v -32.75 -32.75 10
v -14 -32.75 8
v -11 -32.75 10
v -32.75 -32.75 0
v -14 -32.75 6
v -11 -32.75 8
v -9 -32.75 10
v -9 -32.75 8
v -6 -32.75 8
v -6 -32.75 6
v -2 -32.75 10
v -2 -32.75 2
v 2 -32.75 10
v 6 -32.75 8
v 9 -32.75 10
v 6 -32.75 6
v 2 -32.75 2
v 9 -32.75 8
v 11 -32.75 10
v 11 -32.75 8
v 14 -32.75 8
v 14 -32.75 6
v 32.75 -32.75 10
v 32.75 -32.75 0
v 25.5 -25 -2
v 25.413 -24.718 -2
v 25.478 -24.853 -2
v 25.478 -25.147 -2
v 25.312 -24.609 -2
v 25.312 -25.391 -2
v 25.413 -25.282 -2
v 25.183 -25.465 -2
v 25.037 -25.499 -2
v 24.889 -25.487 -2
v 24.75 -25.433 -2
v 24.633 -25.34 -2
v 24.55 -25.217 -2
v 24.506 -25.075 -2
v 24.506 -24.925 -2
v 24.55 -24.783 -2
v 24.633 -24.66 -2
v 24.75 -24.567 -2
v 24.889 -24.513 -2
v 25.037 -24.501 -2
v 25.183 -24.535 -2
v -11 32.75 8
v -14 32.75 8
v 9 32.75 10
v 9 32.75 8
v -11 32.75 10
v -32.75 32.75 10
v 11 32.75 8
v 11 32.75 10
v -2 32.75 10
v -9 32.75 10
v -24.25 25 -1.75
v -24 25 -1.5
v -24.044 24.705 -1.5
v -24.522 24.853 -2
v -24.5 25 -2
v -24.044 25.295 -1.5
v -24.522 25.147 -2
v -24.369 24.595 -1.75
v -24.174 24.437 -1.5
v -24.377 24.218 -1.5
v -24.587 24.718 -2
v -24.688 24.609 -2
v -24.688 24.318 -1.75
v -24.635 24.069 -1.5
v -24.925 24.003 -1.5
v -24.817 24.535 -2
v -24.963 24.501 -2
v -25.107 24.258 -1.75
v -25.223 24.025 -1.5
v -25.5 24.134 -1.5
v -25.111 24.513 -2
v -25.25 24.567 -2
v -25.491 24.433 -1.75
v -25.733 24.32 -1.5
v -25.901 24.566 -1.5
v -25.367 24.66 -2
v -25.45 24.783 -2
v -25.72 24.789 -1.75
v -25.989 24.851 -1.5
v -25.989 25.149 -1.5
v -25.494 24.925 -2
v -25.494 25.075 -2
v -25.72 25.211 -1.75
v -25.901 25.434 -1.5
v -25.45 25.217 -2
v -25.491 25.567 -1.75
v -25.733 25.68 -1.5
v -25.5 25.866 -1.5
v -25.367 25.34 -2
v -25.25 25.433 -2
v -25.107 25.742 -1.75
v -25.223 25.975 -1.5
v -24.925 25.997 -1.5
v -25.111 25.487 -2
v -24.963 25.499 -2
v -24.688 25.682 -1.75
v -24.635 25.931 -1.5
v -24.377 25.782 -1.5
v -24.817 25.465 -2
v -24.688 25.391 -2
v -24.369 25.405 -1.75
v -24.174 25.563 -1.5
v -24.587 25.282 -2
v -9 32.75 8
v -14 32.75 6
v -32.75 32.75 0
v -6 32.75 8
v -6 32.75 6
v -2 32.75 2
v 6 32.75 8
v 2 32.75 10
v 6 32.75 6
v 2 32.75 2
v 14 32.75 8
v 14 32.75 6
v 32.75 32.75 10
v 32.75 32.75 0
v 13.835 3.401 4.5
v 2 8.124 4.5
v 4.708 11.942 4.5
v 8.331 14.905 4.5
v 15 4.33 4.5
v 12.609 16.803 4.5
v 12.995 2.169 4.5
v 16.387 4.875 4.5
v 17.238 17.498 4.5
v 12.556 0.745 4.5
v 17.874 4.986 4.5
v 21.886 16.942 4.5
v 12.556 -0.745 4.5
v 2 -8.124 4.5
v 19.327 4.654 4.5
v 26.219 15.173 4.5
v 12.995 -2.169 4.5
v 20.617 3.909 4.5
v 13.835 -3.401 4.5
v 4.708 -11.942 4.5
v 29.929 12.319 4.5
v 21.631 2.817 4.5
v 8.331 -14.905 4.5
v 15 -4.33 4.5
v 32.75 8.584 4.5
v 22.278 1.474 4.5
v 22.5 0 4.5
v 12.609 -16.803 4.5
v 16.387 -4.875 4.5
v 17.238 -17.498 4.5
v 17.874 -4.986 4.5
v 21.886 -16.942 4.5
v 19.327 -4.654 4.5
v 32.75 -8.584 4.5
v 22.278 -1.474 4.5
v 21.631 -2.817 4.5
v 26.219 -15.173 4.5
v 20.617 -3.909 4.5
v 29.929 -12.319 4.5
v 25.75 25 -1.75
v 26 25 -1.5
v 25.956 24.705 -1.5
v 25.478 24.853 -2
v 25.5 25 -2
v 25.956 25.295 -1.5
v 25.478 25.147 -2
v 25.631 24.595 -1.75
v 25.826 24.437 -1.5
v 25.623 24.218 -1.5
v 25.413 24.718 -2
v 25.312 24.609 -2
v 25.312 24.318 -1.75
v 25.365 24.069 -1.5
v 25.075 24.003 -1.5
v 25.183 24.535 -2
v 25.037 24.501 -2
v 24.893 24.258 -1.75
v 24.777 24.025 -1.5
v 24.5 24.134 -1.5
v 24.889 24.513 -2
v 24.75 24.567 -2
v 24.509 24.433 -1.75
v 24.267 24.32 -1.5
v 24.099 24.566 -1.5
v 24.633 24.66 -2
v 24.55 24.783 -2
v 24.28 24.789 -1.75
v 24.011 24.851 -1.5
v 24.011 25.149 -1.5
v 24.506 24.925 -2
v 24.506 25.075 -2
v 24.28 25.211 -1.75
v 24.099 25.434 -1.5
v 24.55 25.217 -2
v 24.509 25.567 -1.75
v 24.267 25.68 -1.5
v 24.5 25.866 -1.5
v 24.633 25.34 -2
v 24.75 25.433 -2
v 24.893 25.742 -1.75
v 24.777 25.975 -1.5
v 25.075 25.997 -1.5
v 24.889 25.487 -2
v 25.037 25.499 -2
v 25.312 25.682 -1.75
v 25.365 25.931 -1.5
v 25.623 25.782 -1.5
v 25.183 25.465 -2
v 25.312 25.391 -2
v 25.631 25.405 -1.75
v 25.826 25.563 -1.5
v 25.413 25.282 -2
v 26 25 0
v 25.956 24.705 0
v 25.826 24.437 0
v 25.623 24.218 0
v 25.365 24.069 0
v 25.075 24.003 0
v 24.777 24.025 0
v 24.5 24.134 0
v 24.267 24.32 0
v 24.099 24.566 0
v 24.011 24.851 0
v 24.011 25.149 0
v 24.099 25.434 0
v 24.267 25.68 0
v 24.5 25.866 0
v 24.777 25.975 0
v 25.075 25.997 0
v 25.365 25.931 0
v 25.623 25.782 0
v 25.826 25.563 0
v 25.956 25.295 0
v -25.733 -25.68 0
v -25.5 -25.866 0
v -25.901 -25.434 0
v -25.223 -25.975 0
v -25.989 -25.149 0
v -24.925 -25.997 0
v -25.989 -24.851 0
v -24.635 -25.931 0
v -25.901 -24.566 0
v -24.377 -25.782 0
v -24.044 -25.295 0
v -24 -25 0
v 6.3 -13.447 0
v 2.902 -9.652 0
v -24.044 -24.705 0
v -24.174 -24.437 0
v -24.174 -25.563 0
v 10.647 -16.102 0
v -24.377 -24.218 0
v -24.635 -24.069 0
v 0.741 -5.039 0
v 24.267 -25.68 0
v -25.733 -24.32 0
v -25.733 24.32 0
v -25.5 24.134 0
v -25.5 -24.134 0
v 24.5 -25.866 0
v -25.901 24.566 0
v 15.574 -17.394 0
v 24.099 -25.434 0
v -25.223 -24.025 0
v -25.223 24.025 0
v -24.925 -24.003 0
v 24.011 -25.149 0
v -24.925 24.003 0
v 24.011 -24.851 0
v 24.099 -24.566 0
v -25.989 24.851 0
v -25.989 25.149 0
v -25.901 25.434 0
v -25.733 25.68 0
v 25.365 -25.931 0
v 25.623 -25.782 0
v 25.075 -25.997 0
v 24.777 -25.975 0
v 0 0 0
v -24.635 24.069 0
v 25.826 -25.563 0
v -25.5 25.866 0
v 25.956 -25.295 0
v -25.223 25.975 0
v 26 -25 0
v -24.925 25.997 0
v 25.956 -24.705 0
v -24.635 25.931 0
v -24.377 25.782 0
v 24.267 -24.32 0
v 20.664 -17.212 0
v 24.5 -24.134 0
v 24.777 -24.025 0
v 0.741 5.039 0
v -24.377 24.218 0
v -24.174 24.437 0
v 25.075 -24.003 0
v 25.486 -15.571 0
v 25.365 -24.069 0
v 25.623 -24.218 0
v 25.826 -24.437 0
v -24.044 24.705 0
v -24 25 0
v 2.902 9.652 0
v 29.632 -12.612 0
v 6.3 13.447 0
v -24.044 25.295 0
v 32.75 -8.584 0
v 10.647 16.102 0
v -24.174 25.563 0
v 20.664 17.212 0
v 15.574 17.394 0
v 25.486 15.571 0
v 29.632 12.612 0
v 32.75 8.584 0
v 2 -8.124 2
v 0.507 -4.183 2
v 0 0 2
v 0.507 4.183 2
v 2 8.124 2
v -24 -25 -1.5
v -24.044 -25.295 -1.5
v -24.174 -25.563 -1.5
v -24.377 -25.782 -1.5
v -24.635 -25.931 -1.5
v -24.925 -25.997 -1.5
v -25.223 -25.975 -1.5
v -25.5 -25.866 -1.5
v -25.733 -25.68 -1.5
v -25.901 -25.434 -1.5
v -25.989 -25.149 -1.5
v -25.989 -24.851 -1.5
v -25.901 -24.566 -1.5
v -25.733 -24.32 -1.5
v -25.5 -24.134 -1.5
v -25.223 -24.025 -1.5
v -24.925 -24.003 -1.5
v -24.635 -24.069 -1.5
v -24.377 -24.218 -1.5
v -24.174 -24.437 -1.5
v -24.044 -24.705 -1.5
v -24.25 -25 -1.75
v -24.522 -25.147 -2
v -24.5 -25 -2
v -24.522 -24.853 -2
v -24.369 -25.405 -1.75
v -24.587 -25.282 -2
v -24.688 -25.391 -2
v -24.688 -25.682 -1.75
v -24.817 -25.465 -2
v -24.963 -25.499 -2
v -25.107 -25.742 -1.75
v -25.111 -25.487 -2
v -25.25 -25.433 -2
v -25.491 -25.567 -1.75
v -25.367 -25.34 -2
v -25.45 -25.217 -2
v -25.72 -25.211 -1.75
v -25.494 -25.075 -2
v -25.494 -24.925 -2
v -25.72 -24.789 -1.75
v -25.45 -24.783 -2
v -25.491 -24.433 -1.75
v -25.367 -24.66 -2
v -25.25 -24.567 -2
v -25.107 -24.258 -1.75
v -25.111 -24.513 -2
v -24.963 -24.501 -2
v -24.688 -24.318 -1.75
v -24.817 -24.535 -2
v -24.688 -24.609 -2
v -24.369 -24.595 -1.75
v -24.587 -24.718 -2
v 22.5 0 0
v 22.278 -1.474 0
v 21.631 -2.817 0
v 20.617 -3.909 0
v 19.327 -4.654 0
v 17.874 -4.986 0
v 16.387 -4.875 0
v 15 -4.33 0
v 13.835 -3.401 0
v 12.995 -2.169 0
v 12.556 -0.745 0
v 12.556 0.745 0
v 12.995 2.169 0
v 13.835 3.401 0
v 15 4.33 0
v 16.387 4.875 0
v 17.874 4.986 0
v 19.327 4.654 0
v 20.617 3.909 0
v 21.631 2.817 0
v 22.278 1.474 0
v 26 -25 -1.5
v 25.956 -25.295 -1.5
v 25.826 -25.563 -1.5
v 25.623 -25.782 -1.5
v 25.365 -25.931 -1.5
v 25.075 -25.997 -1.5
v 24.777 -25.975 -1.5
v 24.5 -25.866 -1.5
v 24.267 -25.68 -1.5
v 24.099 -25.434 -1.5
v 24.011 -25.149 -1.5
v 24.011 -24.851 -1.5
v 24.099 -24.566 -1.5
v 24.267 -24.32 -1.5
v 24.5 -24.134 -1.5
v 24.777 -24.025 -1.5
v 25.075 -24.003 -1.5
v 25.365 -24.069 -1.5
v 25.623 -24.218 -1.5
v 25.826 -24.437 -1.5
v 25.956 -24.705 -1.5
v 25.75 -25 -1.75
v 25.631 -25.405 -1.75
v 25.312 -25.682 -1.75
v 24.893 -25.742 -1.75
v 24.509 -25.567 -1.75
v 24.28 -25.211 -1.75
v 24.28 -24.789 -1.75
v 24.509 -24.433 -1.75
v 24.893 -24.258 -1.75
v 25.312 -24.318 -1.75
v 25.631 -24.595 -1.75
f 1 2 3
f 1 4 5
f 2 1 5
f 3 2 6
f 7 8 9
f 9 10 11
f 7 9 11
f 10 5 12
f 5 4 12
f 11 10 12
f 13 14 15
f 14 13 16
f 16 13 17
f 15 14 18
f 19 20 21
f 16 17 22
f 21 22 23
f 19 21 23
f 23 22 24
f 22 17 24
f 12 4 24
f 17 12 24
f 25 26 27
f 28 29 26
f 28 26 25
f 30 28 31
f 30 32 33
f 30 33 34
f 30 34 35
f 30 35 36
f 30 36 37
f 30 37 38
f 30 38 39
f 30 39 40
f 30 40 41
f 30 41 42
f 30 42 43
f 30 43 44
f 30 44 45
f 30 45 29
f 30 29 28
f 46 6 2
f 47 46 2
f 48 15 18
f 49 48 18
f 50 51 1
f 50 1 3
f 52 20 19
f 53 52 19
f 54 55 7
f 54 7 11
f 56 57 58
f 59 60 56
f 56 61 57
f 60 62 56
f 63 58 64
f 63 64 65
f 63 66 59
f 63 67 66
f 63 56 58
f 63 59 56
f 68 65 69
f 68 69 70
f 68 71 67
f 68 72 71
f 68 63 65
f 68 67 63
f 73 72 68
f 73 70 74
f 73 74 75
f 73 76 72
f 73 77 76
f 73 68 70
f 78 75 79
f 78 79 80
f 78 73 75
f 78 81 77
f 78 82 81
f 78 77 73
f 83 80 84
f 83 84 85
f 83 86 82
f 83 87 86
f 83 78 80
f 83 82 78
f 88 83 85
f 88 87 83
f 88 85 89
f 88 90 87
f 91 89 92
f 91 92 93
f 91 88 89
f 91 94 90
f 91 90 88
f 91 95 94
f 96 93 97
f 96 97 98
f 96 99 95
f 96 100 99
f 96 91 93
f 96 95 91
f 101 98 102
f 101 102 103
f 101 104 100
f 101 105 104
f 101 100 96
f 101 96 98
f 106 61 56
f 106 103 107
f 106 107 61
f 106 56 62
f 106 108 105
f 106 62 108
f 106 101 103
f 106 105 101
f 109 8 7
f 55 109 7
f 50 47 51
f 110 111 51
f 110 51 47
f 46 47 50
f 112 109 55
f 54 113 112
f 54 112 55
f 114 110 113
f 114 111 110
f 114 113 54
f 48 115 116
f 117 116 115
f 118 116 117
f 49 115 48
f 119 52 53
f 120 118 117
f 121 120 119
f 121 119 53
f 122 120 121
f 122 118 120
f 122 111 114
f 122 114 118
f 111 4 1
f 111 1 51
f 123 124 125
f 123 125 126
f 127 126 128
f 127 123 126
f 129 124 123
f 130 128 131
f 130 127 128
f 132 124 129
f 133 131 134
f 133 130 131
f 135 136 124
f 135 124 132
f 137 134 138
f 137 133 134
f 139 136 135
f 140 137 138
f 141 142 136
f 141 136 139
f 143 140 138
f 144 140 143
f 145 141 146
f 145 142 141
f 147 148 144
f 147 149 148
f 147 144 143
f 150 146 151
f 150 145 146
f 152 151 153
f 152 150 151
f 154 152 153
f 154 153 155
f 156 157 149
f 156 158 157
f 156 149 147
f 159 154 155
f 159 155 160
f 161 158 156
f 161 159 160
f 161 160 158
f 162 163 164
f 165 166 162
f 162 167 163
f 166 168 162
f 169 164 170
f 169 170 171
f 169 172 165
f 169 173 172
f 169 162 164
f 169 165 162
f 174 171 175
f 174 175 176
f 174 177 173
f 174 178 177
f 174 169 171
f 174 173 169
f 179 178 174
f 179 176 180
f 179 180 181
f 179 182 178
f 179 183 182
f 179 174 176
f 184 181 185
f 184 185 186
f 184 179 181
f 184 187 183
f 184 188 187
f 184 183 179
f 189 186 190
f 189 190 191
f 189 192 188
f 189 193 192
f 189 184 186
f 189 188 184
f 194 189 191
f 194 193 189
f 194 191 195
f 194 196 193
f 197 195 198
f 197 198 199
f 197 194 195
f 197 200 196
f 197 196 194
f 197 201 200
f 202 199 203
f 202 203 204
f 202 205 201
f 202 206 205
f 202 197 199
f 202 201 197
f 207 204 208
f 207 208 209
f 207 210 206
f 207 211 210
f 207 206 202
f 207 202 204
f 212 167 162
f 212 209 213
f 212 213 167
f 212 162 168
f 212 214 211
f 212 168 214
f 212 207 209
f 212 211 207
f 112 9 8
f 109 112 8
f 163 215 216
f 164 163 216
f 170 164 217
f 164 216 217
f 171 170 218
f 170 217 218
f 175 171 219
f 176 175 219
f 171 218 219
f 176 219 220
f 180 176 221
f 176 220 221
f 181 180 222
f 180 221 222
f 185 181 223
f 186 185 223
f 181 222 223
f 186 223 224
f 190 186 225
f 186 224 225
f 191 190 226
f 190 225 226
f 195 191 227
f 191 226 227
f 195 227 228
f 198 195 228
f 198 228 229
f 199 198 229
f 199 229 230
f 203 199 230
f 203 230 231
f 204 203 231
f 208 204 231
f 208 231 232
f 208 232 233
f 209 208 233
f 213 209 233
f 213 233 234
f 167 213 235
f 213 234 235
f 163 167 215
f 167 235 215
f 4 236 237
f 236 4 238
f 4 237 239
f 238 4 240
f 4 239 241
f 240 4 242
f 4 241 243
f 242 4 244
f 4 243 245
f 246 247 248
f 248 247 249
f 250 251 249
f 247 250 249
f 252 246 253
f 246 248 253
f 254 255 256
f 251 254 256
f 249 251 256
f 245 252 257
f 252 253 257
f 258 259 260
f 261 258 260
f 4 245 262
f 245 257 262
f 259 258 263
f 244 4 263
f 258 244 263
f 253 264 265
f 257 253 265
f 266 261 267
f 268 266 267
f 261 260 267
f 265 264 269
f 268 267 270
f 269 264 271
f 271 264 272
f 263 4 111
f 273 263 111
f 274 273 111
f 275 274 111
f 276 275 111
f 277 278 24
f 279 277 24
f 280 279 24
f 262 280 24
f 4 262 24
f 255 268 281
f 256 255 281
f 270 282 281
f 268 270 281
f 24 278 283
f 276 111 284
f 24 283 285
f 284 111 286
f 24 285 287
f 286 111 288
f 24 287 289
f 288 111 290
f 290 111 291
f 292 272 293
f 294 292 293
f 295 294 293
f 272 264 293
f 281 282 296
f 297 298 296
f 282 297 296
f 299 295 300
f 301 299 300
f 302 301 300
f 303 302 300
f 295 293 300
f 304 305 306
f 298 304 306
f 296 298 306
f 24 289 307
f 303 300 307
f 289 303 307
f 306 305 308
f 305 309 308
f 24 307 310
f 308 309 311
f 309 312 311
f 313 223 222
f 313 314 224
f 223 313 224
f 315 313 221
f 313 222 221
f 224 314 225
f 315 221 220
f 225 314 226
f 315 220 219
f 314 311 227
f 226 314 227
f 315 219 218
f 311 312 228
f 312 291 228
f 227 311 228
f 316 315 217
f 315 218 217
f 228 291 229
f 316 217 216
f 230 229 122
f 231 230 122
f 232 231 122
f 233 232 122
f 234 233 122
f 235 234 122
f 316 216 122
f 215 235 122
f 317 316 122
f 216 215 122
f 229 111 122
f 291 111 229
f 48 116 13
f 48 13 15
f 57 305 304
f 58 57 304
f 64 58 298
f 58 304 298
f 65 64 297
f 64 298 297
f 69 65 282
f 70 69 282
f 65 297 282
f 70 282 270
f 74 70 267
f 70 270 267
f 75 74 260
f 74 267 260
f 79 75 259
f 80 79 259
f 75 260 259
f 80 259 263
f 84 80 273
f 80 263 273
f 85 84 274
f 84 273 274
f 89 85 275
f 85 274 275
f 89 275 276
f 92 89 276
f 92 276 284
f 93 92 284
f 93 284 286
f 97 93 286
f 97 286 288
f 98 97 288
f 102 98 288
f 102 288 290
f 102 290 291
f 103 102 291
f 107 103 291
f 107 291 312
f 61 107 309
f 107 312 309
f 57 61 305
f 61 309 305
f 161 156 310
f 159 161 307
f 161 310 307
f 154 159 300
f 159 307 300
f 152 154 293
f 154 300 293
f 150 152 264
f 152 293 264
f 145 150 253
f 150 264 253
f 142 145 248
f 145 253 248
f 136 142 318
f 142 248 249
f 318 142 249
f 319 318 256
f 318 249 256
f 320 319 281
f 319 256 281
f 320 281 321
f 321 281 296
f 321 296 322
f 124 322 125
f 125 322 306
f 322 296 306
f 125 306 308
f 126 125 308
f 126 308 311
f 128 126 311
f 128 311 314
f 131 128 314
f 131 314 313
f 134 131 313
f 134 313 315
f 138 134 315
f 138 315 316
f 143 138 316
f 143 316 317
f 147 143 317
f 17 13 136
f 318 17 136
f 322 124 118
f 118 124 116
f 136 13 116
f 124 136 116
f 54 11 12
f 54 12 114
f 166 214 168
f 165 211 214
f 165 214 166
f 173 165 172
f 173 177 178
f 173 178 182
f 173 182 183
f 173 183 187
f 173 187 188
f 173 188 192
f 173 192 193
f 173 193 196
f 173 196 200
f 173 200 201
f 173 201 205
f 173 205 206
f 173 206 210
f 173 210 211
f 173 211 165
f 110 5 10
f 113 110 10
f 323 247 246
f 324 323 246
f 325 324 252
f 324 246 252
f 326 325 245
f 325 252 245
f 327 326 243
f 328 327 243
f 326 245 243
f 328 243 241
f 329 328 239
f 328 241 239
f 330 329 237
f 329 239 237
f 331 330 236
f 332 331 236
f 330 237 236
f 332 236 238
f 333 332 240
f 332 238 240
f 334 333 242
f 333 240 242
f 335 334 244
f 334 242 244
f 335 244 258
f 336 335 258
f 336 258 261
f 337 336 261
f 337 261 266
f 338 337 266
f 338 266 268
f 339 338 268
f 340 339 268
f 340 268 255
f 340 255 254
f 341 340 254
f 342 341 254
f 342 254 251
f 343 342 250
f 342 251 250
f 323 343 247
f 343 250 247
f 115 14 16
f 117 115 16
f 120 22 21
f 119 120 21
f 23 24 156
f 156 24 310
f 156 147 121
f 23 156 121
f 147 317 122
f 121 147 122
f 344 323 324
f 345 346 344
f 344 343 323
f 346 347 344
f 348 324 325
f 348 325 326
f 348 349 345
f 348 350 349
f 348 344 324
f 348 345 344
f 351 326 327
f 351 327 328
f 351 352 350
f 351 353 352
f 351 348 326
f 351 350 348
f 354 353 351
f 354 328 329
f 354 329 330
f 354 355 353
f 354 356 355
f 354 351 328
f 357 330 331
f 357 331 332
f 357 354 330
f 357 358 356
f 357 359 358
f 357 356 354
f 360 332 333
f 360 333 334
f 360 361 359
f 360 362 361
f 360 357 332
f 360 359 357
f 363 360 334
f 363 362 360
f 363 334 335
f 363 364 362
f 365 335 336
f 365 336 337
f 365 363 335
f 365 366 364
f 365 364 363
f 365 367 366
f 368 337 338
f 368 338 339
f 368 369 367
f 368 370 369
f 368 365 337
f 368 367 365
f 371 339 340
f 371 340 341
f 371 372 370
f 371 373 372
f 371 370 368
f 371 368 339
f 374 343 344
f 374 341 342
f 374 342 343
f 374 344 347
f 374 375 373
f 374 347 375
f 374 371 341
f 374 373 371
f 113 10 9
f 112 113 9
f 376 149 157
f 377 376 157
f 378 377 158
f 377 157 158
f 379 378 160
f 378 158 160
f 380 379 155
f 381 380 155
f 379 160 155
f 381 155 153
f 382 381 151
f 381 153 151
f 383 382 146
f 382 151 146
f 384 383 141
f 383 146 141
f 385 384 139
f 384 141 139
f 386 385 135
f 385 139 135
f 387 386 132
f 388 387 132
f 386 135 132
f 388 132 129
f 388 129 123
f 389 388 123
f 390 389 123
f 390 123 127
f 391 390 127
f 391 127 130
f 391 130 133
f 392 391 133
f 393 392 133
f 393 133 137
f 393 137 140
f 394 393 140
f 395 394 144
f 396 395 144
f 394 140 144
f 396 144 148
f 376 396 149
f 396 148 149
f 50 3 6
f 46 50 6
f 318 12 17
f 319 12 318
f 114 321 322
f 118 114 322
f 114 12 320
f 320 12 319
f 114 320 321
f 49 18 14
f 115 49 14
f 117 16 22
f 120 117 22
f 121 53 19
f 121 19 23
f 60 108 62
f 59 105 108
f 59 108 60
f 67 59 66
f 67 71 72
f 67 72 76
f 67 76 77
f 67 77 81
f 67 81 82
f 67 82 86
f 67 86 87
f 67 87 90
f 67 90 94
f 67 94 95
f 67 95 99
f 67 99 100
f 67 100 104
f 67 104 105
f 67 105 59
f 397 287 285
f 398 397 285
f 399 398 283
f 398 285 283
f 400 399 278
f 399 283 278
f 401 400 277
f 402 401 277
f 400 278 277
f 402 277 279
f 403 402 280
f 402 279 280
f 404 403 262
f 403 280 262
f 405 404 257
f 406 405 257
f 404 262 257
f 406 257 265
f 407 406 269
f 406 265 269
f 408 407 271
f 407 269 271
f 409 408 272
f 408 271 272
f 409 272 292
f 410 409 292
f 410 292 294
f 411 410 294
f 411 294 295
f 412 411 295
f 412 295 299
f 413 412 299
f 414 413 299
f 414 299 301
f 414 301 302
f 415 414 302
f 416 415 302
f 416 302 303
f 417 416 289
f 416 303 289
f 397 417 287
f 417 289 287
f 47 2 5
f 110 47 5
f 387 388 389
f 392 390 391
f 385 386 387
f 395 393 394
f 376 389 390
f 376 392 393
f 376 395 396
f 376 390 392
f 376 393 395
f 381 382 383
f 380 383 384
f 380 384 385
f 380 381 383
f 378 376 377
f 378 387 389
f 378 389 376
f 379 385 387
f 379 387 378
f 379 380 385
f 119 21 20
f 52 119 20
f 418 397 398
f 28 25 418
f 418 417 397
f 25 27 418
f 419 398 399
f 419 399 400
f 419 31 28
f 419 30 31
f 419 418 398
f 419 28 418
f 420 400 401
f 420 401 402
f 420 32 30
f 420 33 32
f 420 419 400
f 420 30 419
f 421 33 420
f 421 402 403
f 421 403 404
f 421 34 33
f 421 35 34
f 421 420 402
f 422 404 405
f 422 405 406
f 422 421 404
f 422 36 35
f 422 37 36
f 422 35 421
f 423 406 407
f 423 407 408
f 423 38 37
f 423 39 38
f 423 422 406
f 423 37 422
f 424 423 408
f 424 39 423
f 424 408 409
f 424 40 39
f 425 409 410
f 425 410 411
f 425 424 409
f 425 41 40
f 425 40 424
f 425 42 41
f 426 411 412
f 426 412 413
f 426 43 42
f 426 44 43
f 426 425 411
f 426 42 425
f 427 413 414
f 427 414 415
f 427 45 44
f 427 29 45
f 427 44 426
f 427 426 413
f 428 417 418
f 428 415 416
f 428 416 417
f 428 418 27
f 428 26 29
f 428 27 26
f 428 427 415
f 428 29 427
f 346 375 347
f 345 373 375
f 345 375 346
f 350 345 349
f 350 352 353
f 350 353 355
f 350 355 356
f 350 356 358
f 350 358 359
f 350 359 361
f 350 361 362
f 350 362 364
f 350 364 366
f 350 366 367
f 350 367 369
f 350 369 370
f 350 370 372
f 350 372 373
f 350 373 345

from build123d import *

# Parameters (mm, degrees)
SKETCH_W        = 65.5
SKETCH_H        = 65.5
PAD_DEPTH       = 10
POCKET_DEPTH    = 65.501
SKETCH002_W     = 4
SKETCH002_H     = 65.5
POCKET001_DEPTH = 8
SKETCH003_R     = 17.5
POCKET002_DEPTH = 4.5
SKETCH004_R     = 5
PAD001_DEPTH    = 4.5
SKETCH005_R     = 1
PAD002_DEPTH    = 2
CHAMFER_SIZE    = 0.5


with BuildPart() as part:
    # Sketch → Pad (new body)
    with BuildSketch(Plane.XY):
        Rectangle(SKETCH_W, SKETCH_H)
    extrude(amount=PAD_DEPTH)

    # Sketch001 (on Face3 of Pad) → Pocket (cut, through all)
    with BuildSketch(Plane.XZ.offset(32.75)):
        Polygon((-11.000005, 10), (-11.000005, 8), (-14.000005, 8), (-14.000005, 6), (-6.000005, 6), (-6.000005, 8), (-9.000005, 8), (-8.999995, 10), align=None)
        Polygon((8.999995, 10), (8.999995, 8), (5.999995, 8), (5.999995, 6), (13.999995, 6), (13.999995, 8), (10.999995, 8), (10.999995, 10), align=None)
    extrude(amount=-POCKET_DEPTH, mode=Mode.SUBTRACT)

    # Sketch002 (on Face12 of Pocket) → Pocket001 (cut)
    with BuildSketch(Plane.XY.offset(10)):
        Rectangle(SKETCH002_W, SKETCH002_H)
    extrude(amount=-POCKET001_DEPTH, mode=Mode.SUBTRACT)

    # Sketch003 (on Face2 of Pocket001) → Pocket002 (cut)
    with BuildSketch(Plane(origin=(0, 0, 0), x_dir=(1, 0, 0), z_dir=(0, 0, -1))):
        with Locations((17.5, 0)):
            Circle(SKETCH003_R)
    extrude(amount=-POCKET002_DEPTH, mode=Mode.SUBTRACT)

    # Sketch004 (on Face28 of Pocket002) → Pad001 (join)
    with BuildSketch(Plane(origin=(0, 0, 4.5), x_dir=(1, 0, 0), z_dir=(0, 0, -1))):
        with Locations((17.5, 0)):
            Circle(SKETCH004_R)
    extrude(amount=PAD001_DEPTH)

    # Sketch005 (on Face2 of Pad001) → Pad002 (join)
    with BuildSketch(Plane(origin=(0, 0, 0), x_dir=(1, 0, 0), z_dir=(0, 0, -1))):
        with Locations((-25, 25)):
            Circle(SKETCH005_R)
        with Locations((25, 25)):
            Circle(SKETCH005_R)
        with Locations((-25, -25)):
            Circle(SKETCH005_R)
        with Locations((25, -25)):
            Circle(SKETCH005_R)
    extrude(amount=PAD002_DEPTH)

    # Chamfer
    chamfer_edges = [part.edges().sort_by_distance(p)[0] for p in [
        (-26, -25, -2),
        (-26, 25, -2),
        (24, 25, -2),
        (24, -25, -2),
    ]]
    chamfer(chamfer_edges, length=CHAMFER_SIZE)


solid = part.part
